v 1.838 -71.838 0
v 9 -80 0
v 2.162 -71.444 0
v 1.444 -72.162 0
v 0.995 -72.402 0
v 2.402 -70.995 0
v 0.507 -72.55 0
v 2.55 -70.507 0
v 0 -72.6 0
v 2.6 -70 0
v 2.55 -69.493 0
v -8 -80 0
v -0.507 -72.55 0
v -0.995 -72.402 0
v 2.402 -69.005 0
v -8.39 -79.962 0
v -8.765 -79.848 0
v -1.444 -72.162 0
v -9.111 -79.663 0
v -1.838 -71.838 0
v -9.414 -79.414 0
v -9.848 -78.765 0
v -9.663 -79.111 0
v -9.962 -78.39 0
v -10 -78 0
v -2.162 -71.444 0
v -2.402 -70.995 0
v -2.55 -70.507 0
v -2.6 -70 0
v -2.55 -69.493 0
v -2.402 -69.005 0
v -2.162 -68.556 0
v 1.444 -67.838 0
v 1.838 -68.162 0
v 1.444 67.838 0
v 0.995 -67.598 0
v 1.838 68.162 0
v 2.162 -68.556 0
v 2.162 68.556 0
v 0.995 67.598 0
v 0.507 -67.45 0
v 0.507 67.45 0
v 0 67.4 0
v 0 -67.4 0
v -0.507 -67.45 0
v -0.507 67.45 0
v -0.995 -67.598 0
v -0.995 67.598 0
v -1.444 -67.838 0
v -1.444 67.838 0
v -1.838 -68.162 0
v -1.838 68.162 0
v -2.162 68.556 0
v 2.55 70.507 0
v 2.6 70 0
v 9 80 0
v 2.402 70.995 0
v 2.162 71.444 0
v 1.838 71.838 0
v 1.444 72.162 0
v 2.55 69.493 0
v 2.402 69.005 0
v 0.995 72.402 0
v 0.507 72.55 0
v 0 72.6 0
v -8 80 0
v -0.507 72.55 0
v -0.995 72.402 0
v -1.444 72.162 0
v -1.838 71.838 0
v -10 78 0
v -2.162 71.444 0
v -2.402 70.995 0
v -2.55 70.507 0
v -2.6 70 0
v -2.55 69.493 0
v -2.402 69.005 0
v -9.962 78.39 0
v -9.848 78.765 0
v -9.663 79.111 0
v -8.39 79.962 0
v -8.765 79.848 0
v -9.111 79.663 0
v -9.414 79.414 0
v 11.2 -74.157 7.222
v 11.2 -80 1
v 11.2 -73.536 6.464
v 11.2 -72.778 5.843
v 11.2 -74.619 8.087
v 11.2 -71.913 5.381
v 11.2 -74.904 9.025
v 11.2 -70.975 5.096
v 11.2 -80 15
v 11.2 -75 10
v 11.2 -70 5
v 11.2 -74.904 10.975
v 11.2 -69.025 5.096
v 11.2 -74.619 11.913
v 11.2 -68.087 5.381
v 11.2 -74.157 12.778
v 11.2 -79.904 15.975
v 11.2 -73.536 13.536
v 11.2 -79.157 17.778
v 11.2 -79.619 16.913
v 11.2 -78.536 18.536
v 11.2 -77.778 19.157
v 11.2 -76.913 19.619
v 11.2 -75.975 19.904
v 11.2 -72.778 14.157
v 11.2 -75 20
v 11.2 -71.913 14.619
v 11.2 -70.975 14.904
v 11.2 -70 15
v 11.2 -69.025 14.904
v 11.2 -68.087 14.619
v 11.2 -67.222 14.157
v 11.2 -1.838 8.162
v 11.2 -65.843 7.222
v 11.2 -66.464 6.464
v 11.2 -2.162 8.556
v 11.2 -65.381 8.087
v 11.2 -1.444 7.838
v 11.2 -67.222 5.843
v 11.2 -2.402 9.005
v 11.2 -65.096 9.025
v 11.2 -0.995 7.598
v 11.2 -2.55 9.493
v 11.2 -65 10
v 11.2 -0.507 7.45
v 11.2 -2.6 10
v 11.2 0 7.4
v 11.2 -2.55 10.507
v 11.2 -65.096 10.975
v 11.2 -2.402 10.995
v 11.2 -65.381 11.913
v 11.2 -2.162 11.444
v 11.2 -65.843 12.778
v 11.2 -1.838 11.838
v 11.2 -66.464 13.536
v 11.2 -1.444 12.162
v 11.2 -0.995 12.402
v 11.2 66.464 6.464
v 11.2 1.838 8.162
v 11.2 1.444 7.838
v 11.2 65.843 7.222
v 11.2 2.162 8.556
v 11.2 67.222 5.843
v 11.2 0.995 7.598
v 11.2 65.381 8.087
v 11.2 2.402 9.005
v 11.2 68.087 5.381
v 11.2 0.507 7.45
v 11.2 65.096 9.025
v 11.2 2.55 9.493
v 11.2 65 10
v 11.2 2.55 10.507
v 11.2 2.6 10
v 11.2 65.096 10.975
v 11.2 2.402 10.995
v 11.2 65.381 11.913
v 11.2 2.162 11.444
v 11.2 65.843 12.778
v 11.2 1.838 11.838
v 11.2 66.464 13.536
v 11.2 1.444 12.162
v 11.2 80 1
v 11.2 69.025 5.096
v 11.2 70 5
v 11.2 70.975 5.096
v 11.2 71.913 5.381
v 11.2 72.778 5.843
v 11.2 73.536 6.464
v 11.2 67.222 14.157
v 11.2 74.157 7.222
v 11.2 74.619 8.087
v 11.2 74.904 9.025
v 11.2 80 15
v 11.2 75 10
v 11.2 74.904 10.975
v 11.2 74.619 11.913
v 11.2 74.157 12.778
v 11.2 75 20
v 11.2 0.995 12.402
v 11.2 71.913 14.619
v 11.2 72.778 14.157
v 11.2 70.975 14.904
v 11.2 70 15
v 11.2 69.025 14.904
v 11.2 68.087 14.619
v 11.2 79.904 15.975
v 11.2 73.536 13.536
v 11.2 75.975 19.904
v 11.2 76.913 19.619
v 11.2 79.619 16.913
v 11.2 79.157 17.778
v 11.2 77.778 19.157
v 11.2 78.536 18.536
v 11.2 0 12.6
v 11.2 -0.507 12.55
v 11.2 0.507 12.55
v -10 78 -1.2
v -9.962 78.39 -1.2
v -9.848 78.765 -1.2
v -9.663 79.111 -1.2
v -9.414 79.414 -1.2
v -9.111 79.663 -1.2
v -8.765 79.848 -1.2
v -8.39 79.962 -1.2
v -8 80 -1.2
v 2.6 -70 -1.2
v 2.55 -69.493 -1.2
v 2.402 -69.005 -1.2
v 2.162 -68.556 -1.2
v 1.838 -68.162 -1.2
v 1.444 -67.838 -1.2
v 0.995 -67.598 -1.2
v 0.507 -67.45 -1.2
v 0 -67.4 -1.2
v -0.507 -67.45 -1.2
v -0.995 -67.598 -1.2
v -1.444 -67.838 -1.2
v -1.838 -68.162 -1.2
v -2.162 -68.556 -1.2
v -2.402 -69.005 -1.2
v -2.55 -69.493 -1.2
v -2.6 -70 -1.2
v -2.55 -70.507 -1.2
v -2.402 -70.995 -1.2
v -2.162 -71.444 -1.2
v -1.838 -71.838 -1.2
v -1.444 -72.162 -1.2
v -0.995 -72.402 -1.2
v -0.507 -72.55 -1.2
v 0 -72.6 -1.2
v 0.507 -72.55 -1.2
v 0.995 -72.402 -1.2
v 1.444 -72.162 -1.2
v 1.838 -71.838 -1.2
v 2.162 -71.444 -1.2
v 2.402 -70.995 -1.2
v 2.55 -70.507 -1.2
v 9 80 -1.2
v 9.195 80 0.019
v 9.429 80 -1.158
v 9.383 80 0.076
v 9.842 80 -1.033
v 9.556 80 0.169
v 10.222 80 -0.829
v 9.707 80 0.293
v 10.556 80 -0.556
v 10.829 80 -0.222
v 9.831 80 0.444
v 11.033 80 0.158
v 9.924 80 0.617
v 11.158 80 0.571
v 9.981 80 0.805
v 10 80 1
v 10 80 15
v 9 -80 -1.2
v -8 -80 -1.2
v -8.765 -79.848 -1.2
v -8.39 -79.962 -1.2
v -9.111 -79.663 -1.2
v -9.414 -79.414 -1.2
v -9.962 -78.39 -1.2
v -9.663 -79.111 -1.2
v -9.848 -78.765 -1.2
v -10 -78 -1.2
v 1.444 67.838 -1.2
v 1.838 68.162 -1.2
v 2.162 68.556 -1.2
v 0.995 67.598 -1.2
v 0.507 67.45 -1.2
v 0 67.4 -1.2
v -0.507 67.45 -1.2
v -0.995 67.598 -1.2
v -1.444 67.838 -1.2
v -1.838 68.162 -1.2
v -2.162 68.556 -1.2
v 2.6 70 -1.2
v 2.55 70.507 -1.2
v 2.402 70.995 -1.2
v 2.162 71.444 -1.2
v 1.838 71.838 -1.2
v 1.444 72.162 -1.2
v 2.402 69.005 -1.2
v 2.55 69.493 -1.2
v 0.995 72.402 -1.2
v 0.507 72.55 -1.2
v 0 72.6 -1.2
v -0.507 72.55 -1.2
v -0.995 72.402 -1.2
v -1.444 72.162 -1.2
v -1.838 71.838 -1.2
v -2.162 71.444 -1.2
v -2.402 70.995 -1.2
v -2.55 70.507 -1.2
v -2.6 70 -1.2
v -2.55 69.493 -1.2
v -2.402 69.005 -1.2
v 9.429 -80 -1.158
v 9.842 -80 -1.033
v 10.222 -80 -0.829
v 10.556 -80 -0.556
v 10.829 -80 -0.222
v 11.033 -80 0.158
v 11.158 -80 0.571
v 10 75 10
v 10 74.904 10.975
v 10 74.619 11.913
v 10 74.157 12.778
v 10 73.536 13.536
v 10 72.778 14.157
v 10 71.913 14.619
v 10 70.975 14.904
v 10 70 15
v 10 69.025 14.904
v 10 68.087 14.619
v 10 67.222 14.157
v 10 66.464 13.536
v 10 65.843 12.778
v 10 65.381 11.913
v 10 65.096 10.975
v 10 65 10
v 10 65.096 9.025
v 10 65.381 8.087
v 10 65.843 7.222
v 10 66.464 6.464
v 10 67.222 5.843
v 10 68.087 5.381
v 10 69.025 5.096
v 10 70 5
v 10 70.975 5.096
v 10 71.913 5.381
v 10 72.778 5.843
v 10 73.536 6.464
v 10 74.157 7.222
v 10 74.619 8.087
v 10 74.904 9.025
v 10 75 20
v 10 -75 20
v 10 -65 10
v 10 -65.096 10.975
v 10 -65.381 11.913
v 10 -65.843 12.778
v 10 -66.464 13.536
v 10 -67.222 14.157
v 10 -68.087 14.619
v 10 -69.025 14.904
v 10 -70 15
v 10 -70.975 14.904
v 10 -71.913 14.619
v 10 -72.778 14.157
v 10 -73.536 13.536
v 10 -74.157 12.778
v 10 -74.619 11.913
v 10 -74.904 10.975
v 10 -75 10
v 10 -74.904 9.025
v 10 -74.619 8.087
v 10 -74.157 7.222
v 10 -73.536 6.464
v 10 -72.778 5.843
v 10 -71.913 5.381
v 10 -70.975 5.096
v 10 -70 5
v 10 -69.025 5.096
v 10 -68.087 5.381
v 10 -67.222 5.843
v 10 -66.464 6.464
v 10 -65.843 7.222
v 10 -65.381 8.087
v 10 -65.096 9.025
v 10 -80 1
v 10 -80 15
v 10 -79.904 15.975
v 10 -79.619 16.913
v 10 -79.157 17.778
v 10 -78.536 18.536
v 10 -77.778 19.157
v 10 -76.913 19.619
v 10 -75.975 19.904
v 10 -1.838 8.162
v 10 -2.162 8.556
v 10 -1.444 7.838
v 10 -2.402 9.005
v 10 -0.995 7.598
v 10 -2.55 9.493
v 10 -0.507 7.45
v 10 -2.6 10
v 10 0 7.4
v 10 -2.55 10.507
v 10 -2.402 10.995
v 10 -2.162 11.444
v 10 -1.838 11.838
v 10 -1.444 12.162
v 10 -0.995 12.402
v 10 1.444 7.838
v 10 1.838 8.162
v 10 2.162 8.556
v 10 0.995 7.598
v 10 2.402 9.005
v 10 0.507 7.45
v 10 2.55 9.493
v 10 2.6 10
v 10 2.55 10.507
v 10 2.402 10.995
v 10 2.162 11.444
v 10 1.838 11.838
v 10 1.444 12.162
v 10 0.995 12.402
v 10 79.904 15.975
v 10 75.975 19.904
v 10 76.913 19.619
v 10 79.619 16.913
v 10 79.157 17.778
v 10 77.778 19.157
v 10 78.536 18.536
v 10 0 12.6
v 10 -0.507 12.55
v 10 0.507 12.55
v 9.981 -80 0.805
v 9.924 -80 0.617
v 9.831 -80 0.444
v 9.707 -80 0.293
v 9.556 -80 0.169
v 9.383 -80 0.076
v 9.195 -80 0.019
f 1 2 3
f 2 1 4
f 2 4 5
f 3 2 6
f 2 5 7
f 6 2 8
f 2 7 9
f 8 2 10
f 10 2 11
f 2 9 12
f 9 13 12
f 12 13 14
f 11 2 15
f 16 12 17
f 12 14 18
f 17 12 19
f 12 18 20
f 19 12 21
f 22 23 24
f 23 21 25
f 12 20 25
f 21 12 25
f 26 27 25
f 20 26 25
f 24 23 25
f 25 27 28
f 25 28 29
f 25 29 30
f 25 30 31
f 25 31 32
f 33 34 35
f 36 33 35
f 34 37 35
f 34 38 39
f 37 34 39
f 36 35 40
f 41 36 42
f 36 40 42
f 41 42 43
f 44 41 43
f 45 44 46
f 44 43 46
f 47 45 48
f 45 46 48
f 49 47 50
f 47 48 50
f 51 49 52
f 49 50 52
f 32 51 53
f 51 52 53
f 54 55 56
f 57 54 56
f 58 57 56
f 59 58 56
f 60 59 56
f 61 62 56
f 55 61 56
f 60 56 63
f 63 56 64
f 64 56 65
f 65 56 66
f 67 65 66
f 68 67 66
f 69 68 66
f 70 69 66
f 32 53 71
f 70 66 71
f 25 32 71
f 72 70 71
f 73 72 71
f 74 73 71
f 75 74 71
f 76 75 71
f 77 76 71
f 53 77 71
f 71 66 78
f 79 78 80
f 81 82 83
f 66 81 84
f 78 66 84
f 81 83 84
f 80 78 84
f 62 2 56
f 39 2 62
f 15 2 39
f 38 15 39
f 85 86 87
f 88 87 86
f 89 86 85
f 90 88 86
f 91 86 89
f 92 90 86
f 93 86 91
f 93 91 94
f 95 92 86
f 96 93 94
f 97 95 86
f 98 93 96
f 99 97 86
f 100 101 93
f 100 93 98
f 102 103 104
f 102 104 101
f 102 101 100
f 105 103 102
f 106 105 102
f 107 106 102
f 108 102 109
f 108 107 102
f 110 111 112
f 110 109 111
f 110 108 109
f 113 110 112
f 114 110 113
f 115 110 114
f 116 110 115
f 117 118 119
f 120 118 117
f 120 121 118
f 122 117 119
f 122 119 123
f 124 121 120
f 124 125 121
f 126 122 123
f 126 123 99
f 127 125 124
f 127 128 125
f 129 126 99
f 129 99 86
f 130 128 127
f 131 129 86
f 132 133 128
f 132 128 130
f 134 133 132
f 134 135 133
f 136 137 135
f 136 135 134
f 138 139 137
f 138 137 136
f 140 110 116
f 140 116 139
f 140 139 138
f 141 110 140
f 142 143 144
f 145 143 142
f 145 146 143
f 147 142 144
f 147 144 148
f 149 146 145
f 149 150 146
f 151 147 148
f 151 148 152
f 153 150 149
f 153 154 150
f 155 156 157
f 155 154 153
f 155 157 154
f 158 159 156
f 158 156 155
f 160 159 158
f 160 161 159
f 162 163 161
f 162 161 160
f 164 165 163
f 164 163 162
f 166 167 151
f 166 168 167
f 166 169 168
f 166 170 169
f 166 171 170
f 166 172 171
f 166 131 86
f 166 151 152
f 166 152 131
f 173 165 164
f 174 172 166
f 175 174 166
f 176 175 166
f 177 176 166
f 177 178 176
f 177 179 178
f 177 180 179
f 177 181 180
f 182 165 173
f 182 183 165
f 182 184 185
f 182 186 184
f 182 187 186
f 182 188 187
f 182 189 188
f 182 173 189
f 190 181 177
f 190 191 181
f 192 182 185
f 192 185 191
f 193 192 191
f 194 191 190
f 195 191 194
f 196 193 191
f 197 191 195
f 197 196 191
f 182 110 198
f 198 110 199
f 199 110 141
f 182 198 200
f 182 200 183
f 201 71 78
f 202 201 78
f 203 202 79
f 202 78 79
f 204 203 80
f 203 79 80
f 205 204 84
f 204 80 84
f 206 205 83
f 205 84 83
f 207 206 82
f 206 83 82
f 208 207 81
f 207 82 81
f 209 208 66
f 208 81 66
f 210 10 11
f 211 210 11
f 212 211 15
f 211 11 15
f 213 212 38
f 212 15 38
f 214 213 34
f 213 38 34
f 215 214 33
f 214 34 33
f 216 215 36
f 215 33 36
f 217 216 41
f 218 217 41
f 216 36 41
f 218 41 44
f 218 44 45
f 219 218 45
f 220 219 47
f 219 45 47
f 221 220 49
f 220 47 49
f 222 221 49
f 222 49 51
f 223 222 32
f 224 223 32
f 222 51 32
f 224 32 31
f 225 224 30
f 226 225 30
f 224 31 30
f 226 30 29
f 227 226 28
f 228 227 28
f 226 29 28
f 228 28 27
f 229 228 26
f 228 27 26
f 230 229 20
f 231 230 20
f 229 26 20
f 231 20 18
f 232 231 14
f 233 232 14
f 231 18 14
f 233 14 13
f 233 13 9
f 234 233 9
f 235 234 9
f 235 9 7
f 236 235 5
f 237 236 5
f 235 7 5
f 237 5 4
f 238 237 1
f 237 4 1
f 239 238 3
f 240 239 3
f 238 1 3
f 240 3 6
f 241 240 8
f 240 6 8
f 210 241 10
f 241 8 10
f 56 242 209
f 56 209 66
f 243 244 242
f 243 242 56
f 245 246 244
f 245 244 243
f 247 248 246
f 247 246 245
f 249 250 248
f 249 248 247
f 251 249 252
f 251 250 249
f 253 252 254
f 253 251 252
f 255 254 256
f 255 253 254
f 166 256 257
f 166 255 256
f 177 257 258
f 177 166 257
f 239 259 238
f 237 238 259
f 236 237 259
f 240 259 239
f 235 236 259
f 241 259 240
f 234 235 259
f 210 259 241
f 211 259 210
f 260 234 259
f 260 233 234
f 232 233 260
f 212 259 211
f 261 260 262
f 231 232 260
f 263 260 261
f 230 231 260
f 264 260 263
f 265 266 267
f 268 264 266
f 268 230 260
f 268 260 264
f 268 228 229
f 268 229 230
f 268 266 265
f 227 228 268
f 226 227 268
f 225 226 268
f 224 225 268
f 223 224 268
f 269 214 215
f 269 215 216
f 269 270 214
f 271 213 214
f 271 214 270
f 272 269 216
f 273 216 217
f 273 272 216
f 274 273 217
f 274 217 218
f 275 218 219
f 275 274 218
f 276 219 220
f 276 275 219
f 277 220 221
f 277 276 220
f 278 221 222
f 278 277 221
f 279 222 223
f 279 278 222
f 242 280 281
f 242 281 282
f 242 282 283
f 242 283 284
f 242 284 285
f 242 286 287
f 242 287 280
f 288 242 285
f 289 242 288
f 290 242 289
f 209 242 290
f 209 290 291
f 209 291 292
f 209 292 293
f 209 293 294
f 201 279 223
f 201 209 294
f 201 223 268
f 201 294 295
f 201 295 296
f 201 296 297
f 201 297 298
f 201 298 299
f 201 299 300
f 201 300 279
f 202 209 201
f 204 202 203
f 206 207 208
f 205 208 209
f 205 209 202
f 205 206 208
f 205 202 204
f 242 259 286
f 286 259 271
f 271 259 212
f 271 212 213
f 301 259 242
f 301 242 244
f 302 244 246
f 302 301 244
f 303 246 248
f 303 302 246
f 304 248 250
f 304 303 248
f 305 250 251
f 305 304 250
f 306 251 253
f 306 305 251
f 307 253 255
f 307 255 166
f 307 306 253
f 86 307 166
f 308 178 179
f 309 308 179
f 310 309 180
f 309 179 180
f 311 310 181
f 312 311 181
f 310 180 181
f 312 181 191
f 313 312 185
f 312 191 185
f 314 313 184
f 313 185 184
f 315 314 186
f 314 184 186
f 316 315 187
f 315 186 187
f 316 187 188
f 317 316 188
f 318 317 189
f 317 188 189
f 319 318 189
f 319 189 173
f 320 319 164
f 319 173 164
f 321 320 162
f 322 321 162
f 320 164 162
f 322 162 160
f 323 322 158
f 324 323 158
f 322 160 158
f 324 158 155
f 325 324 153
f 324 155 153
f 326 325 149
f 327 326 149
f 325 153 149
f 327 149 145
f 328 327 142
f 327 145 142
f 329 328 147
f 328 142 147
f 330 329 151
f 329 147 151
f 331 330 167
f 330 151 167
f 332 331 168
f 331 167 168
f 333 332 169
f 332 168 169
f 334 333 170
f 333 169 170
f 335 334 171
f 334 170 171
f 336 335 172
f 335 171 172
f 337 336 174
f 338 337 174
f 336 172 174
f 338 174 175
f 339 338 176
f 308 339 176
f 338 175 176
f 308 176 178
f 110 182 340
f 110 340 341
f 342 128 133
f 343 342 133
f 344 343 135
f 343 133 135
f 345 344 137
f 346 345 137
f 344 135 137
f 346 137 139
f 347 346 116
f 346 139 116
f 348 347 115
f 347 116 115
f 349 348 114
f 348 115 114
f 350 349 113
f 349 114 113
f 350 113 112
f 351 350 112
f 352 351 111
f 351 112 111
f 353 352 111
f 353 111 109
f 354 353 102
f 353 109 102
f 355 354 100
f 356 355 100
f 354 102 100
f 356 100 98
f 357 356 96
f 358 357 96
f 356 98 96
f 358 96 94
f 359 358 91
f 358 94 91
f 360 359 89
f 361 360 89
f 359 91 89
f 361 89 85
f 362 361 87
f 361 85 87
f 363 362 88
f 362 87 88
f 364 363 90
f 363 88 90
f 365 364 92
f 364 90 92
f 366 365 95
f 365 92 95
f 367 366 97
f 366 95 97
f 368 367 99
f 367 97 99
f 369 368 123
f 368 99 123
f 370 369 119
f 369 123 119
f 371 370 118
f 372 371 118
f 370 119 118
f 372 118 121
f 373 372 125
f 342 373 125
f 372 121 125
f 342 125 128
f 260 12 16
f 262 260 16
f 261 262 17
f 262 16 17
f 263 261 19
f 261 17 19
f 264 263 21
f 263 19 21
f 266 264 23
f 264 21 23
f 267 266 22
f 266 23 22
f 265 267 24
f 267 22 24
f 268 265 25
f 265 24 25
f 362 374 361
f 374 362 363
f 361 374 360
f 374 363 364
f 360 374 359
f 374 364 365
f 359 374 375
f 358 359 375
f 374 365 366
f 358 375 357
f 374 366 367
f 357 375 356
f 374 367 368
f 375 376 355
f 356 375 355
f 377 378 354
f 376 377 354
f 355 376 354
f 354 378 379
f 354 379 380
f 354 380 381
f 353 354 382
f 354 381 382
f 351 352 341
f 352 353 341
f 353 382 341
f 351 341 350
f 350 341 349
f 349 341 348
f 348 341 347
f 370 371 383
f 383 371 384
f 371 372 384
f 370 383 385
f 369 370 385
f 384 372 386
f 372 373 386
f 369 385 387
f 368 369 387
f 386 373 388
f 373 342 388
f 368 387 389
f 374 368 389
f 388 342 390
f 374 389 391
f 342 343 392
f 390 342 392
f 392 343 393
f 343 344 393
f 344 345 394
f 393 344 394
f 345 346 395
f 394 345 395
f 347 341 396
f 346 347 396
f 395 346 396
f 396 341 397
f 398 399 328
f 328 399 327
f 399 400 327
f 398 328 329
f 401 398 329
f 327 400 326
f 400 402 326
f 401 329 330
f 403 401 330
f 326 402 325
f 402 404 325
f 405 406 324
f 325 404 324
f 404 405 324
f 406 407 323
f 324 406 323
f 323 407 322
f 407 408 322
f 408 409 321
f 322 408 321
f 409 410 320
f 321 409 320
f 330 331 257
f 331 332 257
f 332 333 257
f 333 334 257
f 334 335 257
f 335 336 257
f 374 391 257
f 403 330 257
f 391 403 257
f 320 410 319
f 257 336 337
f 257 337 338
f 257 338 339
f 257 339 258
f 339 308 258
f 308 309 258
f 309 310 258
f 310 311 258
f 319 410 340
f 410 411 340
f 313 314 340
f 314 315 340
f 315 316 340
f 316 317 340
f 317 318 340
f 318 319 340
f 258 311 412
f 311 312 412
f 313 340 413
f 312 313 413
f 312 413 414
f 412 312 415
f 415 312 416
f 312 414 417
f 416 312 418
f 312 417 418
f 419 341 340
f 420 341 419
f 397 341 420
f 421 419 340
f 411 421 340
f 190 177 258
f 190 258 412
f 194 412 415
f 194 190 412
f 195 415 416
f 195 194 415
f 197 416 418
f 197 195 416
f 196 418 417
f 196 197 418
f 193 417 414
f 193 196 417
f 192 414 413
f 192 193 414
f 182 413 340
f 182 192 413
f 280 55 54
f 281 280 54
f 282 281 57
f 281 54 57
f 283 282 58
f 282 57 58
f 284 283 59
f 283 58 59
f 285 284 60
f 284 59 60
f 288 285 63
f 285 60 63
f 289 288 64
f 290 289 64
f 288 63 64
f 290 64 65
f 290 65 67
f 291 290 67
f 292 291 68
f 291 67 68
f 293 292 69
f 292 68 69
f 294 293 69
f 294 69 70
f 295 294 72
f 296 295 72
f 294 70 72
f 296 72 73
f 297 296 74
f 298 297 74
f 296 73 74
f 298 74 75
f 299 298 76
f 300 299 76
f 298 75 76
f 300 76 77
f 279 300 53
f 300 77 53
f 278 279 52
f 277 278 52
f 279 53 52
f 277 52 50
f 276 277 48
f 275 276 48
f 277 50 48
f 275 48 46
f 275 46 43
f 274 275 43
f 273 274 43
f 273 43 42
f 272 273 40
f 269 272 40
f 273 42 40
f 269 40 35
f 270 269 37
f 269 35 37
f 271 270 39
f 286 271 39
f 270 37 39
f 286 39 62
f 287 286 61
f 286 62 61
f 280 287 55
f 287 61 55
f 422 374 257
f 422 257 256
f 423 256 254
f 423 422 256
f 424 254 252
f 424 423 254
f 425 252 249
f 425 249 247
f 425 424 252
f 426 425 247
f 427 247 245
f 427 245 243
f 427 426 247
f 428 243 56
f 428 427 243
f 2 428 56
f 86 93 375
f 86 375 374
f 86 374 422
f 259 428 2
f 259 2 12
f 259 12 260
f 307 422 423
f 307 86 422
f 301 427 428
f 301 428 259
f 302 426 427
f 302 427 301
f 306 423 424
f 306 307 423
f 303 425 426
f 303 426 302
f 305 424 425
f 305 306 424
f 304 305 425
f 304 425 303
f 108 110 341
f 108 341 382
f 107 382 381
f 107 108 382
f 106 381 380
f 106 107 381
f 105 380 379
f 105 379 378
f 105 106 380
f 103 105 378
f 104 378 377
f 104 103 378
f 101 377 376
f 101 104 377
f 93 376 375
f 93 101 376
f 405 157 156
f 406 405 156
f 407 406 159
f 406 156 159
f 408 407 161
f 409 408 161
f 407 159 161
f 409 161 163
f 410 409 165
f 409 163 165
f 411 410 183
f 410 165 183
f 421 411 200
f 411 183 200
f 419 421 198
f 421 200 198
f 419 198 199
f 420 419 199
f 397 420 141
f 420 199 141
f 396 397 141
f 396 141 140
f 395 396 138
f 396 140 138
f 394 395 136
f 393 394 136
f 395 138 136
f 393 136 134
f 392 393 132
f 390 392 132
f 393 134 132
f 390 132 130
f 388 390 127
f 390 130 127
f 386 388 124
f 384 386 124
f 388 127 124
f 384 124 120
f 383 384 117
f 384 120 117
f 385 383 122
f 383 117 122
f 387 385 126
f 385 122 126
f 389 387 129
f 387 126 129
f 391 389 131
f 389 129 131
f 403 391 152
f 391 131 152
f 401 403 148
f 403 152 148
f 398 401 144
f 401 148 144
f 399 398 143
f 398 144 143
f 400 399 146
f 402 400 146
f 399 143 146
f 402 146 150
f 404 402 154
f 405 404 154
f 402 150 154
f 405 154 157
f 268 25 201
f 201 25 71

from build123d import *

# Parameters (mm, degrees)
SKETCH_1_R                   = 2.6
SM_BASE_FLANGE_1_DEPTH       = 1.2
SM_EDGE_FLANGE_2_DEPTH       = 160
SM_START                     = 1.2
SM_EDGE_FLANGE_2_PROFILE_R   = 5
SM_EDGE_FLANGE_2_PROFILE_R_2 = 2.6
SM_EDGE_FLANGE_2_FLAT_DEPTH  = 1.2


# Sheet-metal steps are written as plain solids
with BuildPart() as part:
    # Sketch 1 → 基体-法兰1 (new body)
    with BuildSketch(Plane.XY):
        with BuildLine():
            Line((-8, 80), (9, 80))
            Line((9, 80), (9, -80))
            Line((9, -80), (-8, -80))
            ThreePointArc((-8, -80), (-9.414213562, -79.414213562), (-10, -78))
            Line((-10, -78), (-10, 78))
            ThreePointArc((-10, 78), (-9.414213562, 79.414213562), (-8, 80))
        make_face()
        with Locations((0, 70)):
            Circle(SKETCH_1_R, mode=Mode.SUBTRACT)
        with Locations((0, -70)):
            Circle(SKETCH_1_R, mode=Mode.SUBTRACT)
    extrude(amount=-SM_BASE_FLANGE_1_DEPTH)

    # 边线-法兰2 bend section (across the edge) → 边线-法兰2 (add)
    with BuildSketch(Plane(origin=(10, -80, 0), x_dir=(-1, 0, 0), z_dir=(0, 1, 0))):
        with BuildLine():
            Line((-1.2, 1), (0, 1))
            ThreePointArc((0, 1), (0.292893219, 0.292893219), (1, 0))
            Line((1, 0), (1, -1.2))
            ThreePointArc((1, -1.2), (-0.555634919, -0.555634919), (-1.2, 1))
        make_face()
    extrude(amount=SM_EDGE_FLANGE_2_DEPTH)

    # 边线-法兰2 profile (on flange) → 边线-法兰2 flat (add)
    with BuildSketch(Plane.YZ.offset(10).offset(SM_START)):
        with BuildLine():
            Line((-80, 15), (-80, 1))
            Line((-80, 1), (80, 1))
            Line((80, 1), (80, 15))
            ThreePointArc((80, 15), (78.535533906, 18.535533906), (75, 20))
            Line((75, 20), (-75, 20))
            ThreePointArc((-75, 20), (-78.535533906, 18.535533906), (-80, 15))
        make_face()
        with Locations((-70, 10)):
            Circle(SM_EDGE_FLANGE_2_PROFILE_R, mode=Mode.SUBTRACT)
        with Locations((0, 10)):
            Circle(SM_EDGE_FLANGE_2_PROFILE_R_2, mode=Mode.SUBTRACT)
        with Locations((70, 10)):
            Circle(SM_EDGE_FLANGE_2_PROFILE_R, mode=Mode.SUBTRACT)
    extrude(amount=-SM_EDGE_FLANGE_2_FLAT_DEPTH)


solid = part.part
